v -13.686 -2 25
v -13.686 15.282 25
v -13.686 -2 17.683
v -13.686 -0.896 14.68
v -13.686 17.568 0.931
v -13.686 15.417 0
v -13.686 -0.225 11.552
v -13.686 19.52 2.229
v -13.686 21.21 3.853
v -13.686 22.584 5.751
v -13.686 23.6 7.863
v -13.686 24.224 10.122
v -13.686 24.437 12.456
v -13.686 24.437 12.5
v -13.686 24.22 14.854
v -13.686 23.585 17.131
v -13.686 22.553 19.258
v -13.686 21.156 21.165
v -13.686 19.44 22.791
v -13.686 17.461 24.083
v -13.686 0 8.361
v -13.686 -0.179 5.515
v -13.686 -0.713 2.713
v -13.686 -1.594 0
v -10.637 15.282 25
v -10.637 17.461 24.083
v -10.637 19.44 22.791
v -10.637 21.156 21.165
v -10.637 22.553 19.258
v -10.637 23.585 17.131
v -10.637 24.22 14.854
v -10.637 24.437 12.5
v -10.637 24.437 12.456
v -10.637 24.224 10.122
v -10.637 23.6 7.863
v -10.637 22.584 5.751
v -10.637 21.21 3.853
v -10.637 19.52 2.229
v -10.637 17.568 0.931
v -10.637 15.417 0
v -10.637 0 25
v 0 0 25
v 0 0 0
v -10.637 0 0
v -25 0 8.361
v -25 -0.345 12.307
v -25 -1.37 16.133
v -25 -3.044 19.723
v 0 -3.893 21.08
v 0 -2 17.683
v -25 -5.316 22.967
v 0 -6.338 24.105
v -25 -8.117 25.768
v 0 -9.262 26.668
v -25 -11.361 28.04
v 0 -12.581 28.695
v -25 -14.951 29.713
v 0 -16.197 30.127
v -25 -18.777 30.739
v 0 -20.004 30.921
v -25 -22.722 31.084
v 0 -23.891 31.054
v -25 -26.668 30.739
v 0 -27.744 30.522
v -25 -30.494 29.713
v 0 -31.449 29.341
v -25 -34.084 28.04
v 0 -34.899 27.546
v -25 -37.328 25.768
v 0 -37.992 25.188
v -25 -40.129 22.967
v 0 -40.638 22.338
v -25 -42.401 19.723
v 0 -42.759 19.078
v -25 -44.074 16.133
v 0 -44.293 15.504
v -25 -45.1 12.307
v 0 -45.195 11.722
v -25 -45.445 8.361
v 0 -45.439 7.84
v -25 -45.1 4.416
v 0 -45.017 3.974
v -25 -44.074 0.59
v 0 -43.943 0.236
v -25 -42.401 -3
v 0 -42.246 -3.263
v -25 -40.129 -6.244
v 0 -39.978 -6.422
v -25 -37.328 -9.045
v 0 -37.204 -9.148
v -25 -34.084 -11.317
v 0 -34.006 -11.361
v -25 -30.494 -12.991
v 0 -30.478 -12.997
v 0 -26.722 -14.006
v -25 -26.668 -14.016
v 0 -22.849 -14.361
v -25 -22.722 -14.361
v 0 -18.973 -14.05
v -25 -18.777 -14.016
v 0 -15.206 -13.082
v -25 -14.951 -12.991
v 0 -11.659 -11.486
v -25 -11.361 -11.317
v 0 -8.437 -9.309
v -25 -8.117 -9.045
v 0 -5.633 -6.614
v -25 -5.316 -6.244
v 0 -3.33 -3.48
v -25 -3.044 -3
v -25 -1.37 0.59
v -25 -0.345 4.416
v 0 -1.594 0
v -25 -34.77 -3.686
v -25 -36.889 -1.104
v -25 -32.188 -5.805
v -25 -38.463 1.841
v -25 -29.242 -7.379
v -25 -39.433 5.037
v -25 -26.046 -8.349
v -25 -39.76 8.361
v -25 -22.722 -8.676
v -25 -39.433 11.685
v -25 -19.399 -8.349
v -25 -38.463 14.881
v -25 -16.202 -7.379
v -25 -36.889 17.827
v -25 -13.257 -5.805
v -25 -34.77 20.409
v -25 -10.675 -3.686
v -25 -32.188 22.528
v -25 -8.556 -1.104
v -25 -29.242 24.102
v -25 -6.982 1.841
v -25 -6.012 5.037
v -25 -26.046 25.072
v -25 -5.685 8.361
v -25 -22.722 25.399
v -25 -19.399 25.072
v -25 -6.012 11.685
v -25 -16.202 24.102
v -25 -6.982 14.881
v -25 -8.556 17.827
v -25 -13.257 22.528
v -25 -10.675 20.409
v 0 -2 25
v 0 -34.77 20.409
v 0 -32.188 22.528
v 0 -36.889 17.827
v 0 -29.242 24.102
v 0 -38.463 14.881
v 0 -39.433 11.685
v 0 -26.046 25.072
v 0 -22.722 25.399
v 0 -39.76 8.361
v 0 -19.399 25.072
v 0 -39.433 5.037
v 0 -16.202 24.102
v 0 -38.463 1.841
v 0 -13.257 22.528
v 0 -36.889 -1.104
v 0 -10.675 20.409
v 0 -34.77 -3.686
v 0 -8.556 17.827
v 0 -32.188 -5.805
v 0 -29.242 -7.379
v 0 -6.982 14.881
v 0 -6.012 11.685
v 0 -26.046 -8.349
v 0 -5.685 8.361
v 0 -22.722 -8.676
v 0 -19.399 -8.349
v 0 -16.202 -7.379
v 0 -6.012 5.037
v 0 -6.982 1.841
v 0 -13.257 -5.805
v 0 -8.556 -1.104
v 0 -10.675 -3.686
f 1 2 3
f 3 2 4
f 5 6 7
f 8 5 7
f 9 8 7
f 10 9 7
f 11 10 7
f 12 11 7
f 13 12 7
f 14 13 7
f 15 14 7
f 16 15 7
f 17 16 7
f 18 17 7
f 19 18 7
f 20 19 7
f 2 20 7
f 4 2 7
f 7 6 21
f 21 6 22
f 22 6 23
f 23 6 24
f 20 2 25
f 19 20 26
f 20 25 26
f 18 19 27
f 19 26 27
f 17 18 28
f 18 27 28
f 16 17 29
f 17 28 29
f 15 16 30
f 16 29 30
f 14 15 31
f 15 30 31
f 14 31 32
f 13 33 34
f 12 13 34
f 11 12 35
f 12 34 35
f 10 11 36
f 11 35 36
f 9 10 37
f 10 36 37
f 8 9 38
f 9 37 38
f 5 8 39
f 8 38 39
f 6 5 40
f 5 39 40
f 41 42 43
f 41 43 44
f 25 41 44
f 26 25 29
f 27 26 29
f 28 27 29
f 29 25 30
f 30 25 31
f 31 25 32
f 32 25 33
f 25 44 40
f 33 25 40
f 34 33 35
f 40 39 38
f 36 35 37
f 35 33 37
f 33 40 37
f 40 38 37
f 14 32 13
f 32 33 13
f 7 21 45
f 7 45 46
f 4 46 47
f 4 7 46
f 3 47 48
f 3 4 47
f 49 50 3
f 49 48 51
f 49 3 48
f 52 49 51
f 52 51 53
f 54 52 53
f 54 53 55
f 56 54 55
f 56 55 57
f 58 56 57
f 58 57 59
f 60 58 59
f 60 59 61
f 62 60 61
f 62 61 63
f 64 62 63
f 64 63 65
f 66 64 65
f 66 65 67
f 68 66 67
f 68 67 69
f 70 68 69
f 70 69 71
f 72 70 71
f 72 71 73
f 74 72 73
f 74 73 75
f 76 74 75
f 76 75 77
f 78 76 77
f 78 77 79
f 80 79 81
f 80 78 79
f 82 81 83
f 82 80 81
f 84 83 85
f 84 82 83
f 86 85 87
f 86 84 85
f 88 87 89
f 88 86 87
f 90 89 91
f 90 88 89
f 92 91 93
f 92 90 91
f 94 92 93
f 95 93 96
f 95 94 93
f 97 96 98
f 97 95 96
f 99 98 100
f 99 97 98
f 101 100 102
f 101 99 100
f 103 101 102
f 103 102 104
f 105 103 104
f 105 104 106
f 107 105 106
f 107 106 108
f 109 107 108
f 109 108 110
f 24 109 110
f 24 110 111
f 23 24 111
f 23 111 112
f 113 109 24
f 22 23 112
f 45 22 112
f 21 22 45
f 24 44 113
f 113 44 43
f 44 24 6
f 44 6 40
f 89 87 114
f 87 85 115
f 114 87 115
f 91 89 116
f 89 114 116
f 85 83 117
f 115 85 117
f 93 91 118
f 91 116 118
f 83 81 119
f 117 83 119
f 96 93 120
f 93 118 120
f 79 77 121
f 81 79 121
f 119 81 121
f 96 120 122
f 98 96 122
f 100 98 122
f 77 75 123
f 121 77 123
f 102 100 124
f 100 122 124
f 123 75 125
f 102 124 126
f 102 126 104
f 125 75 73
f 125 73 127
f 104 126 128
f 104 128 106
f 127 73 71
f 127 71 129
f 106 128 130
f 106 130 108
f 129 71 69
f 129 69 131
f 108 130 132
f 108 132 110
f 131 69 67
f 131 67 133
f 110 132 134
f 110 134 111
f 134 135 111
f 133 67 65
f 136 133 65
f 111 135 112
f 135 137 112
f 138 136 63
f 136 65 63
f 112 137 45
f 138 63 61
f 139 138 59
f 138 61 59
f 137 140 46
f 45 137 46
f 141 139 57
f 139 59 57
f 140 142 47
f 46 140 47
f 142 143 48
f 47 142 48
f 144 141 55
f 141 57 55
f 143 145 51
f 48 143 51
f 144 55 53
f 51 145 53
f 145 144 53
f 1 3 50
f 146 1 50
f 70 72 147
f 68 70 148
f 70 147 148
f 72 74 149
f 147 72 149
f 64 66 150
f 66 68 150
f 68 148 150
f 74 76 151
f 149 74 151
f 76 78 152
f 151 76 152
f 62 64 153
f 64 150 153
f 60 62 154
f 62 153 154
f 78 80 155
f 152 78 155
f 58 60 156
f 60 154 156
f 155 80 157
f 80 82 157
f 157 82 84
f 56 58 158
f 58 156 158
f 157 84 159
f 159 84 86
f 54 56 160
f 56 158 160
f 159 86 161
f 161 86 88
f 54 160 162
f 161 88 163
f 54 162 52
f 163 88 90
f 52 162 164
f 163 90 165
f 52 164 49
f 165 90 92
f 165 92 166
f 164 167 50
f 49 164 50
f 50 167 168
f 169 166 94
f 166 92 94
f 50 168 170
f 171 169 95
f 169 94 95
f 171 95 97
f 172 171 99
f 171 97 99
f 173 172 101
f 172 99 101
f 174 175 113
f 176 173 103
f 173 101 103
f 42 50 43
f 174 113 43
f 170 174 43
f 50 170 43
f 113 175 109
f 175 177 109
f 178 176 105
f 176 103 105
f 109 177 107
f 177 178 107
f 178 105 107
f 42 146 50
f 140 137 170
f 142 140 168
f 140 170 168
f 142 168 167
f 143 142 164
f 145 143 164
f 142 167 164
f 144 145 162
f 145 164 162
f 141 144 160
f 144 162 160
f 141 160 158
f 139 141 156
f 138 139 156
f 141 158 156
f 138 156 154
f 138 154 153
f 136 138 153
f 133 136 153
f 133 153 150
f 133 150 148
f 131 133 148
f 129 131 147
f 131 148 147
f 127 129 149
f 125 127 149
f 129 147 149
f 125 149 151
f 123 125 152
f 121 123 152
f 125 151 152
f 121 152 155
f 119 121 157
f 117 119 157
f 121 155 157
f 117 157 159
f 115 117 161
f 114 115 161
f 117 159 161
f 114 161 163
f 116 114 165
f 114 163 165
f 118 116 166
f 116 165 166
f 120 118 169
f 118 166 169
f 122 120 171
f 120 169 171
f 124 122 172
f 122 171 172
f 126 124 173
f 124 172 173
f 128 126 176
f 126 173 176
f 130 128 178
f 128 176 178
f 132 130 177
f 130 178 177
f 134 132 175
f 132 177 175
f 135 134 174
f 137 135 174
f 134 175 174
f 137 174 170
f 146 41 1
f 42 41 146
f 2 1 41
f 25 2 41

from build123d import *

# Parameters (mm, degrees)
F1_DEPTH = 25
F3_DEPTH = 25
F4_R     = 22.7224143994
F4_R_2   = 17.0375954798
F5_DEPTH = 25


# Not quite as in the source:
# - ends of sketch curves that miss each other by under 0.0002 mm in the source are joined


with BuildPart() as f1:
    # F0 (on Top) → F1 (new body)
    with BuildSketch(Plane.XY):
        Polygon((0, 0), (-10.6365969405, 0), (-10.6365969405, 24.4365315884), (-13.6861931533, 24.4365315884), (-13.6861931533, 0), (-13.6861931533, -2), (0, -2), align=None)
    extrude(amount=F1_DEPTH)

    # F2 (on face) → F3 (cut)
    with BuildSketch(Plane.YZ.offset(-10.6365969405)):
        with BuildLine():
            ThreePointArc((24.4365498995, 12.4780622919), (21.9456846424, 4.7798806359), (15.4173501195, 0))
            Line((15.4173501195, 0), (24.4365315884, 0))
            Line((24.4365315884, 0), (24.4365498995, 12.4780622919))
        make_face()
        with BuildLine():
            ThreePointArc((15.2820812933, 25), (21.9038763933, 20.233757287), (24.4365498995, 12.4780622919))
            Line((24.4365498995, 12.4780622919), (24.4365315884, 25))
            Line((24.4365315884, 25), (15.2820812933, 25))
        make_face()
    extrude(amount=-F3_DEPTH, mode=Mode.SUBTRACT)

    # F4 (on Right) → F5 (join)
    with BuildSketch(Plane.YZ):
        with Locations((-22.7224143994, 8.3613144234)):
            Circle(F4_R)
        with Locations((-22.7224143994, 8.3613144234)):
            Circle(F4_R_2, mode=Mode.SUBTRACT)
    extrude(amount=-F5_DEPTH)


solid = f1.part
